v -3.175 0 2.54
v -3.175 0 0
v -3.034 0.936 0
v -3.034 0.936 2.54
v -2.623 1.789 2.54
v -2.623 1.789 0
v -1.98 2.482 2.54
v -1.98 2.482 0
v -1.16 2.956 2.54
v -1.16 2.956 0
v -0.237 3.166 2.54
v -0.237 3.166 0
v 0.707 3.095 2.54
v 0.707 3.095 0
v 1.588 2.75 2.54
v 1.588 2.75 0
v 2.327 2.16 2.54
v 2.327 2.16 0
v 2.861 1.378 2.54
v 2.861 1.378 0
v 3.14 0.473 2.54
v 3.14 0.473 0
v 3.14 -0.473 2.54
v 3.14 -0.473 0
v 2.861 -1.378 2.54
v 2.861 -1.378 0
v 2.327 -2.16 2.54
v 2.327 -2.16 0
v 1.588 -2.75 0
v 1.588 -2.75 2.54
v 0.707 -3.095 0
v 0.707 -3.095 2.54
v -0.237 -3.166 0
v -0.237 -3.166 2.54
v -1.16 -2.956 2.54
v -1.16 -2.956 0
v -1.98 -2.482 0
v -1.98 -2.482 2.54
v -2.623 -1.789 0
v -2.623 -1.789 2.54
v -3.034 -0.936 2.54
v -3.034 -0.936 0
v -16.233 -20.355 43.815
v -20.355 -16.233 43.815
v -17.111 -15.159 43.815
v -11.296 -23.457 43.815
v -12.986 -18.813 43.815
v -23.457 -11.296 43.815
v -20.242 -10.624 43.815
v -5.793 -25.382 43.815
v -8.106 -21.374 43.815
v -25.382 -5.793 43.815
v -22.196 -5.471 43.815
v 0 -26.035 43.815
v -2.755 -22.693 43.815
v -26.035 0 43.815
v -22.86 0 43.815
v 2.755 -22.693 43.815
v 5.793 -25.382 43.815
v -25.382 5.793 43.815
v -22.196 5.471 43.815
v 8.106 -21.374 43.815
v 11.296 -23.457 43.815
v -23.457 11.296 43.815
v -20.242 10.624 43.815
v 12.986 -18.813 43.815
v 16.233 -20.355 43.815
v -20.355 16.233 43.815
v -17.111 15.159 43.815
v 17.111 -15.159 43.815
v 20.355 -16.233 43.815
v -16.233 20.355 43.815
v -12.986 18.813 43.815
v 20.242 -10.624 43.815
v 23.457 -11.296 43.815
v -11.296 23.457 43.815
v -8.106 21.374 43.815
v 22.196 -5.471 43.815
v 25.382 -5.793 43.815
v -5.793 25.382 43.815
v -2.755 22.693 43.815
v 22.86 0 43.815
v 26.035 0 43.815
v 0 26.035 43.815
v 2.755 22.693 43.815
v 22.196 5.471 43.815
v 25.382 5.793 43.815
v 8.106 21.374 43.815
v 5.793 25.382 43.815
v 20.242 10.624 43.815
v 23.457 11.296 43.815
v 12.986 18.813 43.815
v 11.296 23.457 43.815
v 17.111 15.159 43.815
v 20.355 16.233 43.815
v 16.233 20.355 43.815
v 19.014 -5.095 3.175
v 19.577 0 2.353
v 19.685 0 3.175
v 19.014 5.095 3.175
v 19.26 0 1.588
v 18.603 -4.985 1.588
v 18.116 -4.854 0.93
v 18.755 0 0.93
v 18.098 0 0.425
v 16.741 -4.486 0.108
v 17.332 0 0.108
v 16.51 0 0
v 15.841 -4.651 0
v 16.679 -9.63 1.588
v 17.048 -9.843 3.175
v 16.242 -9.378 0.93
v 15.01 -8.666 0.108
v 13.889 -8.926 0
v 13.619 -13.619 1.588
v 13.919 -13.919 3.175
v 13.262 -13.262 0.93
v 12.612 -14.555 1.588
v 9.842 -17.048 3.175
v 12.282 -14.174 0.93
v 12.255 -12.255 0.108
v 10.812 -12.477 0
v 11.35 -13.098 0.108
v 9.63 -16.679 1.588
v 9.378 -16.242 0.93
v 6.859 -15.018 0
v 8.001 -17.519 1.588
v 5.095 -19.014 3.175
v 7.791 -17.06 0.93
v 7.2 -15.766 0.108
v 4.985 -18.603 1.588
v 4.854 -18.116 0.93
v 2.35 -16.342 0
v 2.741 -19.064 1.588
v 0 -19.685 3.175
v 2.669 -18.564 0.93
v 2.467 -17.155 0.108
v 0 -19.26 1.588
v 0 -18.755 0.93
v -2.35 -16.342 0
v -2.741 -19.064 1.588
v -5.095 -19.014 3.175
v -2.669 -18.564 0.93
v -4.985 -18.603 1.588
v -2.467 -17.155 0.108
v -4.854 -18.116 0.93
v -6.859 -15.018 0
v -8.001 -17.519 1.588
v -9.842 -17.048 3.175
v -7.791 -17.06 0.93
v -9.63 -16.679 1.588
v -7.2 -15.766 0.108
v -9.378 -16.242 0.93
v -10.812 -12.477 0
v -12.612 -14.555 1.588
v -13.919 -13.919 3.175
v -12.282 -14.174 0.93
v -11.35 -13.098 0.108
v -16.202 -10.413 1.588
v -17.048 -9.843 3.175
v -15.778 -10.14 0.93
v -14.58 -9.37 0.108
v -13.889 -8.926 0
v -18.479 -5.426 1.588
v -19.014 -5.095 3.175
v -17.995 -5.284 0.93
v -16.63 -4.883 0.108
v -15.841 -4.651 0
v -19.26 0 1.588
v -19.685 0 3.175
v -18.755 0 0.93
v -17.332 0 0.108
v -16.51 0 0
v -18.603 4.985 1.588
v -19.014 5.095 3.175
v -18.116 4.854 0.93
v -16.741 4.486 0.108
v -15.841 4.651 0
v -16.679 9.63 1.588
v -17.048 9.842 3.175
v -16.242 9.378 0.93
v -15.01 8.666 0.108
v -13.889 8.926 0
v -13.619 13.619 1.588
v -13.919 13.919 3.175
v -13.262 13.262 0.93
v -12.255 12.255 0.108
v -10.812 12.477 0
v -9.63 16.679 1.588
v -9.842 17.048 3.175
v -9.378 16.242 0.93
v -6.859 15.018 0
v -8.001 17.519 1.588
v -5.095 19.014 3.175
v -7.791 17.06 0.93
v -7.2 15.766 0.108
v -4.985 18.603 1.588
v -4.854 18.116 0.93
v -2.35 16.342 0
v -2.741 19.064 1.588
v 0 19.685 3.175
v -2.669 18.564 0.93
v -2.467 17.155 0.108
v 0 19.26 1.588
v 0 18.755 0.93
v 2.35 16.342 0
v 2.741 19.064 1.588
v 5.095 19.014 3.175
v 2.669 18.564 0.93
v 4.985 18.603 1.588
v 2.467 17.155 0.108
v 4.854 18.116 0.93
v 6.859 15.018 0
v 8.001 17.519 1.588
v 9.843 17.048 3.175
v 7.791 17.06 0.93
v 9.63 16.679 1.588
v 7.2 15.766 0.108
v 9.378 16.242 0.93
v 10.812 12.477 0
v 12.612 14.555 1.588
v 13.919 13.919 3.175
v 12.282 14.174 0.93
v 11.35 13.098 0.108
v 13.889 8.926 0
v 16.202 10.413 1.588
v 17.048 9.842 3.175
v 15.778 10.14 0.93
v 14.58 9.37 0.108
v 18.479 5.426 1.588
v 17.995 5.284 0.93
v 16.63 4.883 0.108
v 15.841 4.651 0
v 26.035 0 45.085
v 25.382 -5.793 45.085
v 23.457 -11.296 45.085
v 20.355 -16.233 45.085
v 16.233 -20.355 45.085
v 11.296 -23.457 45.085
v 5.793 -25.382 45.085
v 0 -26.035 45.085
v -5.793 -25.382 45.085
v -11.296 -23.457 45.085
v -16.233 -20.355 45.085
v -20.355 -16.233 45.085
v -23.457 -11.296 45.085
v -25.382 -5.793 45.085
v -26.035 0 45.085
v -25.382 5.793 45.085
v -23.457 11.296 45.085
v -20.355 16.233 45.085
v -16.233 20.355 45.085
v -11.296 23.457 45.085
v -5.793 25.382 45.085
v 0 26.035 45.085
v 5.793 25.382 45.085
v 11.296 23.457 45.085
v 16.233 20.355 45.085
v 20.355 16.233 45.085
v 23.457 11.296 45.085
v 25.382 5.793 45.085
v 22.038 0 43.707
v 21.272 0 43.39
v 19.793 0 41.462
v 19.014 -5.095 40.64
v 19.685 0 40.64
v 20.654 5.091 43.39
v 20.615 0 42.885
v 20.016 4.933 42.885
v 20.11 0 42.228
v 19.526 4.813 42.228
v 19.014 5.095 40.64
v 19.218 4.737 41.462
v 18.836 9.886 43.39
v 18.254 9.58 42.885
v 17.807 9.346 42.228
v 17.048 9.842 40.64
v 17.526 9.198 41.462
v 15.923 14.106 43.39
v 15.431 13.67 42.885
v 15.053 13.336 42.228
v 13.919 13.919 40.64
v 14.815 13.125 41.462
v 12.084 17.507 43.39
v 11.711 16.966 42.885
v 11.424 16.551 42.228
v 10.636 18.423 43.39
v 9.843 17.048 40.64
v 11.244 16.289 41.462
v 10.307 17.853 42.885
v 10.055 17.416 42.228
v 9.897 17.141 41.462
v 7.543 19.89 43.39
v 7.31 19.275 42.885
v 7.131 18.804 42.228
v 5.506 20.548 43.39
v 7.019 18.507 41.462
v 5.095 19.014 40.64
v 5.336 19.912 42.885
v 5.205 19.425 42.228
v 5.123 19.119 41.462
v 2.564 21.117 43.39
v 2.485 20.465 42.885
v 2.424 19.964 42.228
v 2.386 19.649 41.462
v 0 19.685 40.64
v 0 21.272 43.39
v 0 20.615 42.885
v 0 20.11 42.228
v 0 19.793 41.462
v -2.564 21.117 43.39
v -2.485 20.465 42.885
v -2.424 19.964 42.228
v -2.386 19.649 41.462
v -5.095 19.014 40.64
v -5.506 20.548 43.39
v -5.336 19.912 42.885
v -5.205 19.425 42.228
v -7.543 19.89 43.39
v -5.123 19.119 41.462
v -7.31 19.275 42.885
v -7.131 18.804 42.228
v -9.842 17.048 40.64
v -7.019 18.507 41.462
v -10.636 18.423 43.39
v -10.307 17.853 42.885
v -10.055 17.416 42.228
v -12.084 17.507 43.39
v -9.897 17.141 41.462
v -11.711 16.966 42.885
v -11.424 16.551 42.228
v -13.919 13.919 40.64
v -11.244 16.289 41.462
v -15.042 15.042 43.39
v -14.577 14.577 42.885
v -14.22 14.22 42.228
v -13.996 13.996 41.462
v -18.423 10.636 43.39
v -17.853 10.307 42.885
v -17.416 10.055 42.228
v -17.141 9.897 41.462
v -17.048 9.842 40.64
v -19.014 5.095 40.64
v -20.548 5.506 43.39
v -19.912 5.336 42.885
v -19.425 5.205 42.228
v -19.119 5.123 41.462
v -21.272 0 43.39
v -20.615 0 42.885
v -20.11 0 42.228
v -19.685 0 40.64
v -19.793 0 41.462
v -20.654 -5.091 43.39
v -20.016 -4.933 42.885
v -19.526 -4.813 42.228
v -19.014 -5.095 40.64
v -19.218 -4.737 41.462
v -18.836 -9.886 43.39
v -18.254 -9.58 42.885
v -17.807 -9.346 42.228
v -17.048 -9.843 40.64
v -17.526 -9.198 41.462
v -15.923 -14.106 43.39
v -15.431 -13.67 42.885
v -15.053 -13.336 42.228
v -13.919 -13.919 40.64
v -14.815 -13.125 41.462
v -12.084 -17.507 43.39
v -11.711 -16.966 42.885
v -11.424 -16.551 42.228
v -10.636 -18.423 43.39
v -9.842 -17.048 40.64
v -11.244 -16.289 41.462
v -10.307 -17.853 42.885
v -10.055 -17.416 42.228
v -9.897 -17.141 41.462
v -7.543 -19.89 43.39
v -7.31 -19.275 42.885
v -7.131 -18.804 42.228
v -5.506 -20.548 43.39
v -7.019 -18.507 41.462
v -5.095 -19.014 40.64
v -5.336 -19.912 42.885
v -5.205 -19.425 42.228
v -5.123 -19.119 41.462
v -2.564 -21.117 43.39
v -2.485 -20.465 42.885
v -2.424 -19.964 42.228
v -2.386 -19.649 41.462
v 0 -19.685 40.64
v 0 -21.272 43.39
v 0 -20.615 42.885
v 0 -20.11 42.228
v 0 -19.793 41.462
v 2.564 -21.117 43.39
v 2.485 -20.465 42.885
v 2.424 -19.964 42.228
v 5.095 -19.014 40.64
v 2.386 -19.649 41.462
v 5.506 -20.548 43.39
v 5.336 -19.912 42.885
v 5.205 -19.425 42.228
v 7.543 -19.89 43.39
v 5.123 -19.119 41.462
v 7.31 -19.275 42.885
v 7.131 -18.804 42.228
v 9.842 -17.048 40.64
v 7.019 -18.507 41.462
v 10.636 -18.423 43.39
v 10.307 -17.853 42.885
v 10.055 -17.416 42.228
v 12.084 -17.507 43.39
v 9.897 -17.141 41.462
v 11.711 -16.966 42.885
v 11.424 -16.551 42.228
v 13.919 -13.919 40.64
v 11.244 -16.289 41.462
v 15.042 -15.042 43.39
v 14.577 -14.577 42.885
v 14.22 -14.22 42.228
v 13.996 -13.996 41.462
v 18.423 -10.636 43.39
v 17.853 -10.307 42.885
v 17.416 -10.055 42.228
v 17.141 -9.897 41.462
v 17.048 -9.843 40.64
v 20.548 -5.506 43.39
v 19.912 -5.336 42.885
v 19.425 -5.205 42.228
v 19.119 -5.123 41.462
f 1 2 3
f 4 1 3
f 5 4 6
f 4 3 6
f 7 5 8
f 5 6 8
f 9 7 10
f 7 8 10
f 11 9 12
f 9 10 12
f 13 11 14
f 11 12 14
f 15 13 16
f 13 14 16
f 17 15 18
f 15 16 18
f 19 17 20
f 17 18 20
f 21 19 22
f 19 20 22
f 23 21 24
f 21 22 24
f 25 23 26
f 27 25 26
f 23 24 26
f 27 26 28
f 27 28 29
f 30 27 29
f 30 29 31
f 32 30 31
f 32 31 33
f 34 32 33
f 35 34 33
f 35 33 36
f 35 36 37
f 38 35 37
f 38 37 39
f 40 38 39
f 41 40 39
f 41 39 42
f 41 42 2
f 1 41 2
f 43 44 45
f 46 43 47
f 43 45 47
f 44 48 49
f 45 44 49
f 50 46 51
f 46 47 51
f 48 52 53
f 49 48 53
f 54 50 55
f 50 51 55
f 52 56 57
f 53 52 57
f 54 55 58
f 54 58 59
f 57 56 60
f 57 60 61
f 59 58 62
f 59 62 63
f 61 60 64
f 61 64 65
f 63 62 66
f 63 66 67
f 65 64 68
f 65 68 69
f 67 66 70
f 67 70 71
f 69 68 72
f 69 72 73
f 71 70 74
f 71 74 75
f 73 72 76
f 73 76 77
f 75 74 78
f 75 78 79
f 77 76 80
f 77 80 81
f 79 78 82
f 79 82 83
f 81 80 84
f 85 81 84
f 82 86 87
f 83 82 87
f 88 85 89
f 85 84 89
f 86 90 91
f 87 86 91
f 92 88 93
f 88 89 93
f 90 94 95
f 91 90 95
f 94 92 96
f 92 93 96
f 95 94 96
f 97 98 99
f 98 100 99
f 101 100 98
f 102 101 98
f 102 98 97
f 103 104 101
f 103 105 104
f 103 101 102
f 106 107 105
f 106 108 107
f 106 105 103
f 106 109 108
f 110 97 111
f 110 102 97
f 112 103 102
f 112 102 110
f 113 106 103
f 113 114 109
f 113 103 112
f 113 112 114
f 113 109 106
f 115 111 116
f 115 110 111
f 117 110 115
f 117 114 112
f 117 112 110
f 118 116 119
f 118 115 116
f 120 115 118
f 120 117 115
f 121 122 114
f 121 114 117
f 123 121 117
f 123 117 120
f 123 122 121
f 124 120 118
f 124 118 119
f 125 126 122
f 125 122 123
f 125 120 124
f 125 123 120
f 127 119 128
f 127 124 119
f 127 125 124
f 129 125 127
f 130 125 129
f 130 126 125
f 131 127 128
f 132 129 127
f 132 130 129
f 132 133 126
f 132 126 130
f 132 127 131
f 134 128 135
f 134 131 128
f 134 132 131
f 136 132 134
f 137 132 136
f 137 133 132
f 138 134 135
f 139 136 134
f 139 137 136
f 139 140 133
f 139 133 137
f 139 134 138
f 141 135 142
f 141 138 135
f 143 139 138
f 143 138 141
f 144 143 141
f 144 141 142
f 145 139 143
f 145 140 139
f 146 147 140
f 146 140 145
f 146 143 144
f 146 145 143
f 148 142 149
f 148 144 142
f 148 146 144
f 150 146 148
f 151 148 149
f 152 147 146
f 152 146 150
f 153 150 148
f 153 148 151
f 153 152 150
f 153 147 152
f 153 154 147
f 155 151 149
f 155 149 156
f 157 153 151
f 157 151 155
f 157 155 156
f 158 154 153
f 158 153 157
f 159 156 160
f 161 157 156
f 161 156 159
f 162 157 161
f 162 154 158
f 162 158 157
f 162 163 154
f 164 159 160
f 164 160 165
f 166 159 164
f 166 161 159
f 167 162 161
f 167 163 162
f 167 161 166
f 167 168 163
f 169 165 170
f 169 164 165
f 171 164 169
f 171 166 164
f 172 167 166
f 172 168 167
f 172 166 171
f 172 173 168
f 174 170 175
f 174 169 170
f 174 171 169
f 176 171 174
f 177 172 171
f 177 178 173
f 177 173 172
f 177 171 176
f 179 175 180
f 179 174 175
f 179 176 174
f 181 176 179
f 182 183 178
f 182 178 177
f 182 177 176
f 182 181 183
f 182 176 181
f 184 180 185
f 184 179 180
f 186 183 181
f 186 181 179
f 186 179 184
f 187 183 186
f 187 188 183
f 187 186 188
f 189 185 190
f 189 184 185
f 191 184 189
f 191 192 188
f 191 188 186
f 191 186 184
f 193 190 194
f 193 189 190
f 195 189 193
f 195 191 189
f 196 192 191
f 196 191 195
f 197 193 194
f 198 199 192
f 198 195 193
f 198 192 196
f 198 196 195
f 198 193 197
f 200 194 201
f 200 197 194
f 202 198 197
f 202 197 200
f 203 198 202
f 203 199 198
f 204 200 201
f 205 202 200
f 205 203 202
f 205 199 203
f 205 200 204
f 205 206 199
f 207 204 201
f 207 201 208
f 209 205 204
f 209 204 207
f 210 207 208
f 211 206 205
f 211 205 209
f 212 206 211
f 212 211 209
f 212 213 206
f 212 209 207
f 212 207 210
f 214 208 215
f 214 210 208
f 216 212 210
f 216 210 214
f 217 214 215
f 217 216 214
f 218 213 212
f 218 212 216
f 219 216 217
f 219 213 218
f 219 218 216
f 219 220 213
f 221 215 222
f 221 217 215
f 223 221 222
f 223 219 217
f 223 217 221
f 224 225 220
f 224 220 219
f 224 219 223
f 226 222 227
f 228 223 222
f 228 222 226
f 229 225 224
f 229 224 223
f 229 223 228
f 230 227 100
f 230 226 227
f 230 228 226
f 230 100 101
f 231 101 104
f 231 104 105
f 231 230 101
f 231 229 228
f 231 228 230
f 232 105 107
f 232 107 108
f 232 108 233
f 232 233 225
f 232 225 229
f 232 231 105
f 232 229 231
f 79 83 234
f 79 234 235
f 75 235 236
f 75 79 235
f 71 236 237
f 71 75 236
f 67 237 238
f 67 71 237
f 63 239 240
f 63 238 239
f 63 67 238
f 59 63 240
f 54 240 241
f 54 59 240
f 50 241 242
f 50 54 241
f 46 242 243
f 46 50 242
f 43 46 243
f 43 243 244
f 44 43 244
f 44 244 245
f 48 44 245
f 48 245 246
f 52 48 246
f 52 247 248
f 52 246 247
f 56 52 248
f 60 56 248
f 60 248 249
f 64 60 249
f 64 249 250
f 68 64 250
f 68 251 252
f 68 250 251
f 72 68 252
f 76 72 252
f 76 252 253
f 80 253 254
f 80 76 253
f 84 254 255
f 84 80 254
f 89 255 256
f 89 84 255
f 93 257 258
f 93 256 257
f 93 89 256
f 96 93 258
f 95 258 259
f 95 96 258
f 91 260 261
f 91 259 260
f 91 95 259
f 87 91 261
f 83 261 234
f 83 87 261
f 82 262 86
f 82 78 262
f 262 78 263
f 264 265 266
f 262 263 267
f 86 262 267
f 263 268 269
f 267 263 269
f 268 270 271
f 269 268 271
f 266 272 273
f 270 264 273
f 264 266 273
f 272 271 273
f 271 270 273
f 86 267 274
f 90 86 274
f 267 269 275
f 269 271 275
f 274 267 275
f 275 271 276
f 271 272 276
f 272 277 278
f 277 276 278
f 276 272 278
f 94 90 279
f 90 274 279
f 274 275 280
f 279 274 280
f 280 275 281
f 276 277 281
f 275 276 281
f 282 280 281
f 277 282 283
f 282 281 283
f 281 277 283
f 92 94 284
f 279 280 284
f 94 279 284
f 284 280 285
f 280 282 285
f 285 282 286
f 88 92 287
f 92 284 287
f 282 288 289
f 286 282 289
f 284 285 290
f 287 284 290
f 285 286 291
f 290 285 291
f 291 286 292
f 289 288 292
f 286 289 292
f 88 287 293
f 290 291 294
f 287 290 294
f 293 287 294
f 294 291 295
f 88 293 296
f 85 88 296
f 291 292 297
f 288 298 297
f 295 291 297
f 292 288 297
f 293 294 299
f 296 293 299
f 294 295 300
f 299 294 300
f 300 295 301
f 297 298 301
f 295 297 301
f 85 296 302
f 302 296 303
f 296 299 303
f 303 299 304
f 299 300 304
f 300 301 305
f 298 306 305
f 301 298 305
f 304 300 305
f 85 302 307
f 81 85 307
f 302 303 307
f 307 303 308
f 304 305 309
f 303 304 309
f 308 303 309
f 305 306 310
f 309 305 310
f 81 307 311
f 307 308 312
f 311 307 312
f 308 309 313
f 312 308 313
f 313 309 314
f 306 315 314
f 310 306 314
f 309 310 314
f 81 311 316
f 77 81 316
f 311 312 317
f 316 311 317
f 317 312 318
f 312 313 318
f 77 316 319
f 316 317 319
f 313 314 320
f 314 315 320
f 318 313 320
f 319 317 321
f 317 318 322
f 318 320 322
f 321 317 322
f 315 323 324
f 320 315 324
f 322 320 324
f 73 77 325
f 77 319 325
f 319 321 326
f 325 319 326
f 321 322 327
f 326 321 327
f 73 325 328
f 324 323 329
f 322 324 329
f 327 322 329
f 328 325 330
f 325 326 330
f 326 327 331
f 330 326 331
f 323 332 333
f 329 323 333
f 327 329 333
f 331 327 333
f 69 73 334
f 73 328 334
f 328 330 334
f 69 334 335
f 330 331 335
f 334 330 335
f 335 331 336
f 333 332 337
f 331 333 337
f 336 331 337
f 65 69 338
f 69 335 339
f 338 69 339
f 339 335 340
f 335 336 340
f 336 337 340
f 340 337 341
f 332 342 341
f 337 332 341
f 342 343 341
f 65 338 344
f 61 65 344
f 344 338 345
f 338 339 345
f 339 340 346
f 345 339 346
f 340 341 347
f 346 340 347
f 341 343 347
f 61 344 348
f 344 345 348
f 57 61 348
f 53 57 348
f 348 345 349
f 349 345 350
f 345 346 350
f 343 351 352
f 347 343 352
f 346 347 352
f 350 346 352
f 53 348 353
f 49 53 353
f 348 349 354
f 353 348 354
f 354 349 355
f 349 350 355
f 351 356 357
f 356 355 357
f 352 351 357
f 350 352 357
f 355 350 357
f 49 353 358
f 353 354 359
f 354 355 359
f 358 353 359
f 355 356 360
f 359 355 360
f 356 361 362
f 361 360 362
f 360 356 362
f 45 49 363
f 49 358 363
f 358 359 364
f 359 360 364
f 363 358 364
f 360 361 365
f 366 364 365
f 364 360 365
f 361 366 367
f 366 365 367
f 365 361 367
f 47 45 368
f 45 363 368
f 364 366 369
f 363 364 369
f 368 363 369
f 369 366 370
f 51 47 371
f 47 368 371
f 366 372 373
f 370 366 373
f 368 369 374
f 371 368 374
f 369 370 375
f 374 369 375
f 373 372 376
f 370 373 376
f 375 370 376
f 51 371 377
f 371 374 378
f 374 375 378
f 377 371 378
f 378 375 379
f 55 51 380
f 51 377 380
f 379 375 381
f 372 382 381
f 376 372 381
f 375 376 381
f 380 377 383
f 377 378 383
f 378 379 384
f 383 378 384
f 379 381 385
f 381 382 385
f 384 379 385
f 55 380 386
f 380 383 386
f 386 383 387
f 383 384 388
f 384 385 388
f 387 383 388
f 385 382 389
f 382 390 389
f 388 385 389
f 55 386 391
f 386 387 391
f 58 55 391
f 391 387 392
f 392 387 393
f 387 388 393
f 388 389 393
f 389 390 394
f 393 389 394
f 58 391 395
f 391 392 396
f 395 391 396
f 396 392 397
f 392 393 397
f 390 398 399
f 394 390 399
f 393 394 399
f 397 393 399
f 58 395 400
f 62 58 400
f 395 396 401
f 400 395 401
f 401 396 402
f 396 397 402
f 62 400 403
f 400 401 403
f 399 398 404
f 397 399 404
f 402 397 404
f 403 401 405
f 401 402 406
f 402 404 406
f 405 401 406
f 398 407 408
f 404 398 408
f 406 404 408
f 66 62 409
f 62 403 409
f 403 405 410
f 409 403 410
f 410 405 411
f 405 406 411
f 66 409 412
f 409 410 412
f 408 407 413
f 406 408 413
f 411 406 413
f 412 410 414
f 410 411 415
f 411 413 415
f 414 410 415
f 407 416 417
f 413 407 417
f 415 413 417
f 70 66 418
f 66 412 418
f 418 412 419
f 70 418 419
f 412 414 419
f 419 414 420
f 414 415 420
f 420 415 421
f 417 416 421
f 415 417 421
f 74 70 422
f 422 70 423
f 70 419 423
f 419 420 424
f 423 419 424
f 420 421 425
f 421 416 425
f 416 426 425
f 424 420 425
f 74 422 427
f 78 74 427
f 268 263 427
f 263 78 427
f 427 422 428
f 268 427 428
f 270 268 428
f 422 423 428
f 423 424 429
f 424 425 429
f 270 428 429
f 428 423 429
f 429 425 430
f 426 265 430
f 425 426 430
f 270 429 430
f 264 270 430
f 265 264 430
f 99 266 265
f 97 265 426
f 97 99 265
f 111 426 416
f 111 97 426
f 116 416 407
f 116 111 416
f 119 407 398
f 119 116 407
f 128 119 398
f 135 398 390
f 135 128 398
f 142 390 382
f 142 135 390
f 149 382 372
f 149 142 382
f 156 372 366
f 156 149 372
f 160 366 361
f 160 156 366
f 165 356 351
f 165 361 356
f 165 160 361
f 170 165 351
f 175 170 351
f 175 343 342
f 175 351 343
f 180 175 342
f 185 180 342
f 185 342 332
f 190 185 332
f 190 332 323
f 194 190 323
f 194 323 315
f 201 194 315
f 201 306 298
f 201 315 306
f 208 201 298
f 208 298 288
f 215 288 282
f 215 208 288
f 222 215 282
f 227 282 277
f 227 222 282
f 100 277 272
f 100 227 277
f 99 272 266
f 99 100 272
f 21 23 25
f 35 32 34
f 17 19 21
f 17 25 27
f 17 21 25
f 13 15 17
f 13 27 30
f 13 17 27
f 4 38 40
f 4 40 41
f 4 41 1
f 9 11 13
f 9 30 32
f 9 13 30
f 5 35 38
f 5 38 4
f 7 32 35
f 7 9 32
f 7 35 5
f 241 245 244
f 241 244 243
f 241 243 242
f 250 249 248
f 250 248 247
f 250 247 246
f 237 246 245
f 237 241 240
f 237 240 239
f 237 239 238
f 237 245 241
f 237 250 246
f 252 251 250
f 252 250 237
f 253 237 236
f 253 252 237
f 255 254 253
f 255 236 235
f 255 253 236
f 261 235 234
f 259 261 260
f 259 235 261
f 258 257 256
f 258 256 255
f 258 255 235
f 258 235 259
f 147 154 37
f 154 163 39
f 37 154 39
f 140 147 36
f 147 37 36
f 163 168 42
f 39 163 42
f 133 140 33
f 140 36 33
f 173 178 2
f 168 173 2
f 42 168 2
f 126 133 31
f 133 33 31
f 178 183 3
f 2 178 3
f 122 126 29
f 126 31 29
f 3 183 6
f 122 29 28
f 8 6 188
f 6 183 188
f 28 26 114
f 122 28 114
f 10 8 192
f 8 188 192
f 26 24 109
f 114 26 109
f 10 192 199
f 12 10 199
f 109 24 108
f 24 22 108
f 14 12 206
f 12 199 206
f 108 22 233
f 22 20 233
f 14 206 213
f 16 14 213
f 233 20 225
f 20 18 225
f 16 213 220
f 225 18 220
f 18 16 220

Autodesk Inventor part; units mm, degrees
ref_plane "YZ Plane" through (0, 0, 0) normal (1, 0, 0) x (0, 1, 0)
ref_plane "XZ Plane" through (0, 0, 0) normal (0, 1, 0) x (-1, 0, 0)
ref_plane "XY Plane" through (0, 0, 0) normal (0, 0, 1) x (1, 0, 0)
sketch "Sketch1" plane through (0, 0, 0) normal (0, 0, 1) x (1, 0, 0)
  circle A0 centre (0, 0) radius 19.685
  dimension "d0" = 39.37
extrude "Extrusion1" add sketch "Sketch1" along normal blind 43.815
sketch "Sketch2" plane through (0, 0, 43.815) normal (0, 0, 1) x (1, 0, 0)
  circle A0 centre (0, 0) radius 19.685 projected
  circle A1 centre (0, 0) radius 26.035
  dimension "d4" = 52.07
extrude "Extrusion2" add sketch "Sketch2" along normal blind 1.27 contours A0 | A1
fillet "Fillet1" radius 3.175 2 edges at (-19.685, 0, 0) (-19.685, 0, 43.815)
sketch "Sketch3" plane through (0, 0, 0) normal (0, 0, -1) x (-1, 0, 0)
  circle A0 centre (0, 0) radius 16.51 projected
  circle A1 centre (0, 0) radius 3.175
  dimension "d9" = 6.35
extrude "Extrusion3" cut sketch "Sketch3" against normal blind 2.54 contours A1
properties part number "Lg Motor Top" material "ABS Plastic"
